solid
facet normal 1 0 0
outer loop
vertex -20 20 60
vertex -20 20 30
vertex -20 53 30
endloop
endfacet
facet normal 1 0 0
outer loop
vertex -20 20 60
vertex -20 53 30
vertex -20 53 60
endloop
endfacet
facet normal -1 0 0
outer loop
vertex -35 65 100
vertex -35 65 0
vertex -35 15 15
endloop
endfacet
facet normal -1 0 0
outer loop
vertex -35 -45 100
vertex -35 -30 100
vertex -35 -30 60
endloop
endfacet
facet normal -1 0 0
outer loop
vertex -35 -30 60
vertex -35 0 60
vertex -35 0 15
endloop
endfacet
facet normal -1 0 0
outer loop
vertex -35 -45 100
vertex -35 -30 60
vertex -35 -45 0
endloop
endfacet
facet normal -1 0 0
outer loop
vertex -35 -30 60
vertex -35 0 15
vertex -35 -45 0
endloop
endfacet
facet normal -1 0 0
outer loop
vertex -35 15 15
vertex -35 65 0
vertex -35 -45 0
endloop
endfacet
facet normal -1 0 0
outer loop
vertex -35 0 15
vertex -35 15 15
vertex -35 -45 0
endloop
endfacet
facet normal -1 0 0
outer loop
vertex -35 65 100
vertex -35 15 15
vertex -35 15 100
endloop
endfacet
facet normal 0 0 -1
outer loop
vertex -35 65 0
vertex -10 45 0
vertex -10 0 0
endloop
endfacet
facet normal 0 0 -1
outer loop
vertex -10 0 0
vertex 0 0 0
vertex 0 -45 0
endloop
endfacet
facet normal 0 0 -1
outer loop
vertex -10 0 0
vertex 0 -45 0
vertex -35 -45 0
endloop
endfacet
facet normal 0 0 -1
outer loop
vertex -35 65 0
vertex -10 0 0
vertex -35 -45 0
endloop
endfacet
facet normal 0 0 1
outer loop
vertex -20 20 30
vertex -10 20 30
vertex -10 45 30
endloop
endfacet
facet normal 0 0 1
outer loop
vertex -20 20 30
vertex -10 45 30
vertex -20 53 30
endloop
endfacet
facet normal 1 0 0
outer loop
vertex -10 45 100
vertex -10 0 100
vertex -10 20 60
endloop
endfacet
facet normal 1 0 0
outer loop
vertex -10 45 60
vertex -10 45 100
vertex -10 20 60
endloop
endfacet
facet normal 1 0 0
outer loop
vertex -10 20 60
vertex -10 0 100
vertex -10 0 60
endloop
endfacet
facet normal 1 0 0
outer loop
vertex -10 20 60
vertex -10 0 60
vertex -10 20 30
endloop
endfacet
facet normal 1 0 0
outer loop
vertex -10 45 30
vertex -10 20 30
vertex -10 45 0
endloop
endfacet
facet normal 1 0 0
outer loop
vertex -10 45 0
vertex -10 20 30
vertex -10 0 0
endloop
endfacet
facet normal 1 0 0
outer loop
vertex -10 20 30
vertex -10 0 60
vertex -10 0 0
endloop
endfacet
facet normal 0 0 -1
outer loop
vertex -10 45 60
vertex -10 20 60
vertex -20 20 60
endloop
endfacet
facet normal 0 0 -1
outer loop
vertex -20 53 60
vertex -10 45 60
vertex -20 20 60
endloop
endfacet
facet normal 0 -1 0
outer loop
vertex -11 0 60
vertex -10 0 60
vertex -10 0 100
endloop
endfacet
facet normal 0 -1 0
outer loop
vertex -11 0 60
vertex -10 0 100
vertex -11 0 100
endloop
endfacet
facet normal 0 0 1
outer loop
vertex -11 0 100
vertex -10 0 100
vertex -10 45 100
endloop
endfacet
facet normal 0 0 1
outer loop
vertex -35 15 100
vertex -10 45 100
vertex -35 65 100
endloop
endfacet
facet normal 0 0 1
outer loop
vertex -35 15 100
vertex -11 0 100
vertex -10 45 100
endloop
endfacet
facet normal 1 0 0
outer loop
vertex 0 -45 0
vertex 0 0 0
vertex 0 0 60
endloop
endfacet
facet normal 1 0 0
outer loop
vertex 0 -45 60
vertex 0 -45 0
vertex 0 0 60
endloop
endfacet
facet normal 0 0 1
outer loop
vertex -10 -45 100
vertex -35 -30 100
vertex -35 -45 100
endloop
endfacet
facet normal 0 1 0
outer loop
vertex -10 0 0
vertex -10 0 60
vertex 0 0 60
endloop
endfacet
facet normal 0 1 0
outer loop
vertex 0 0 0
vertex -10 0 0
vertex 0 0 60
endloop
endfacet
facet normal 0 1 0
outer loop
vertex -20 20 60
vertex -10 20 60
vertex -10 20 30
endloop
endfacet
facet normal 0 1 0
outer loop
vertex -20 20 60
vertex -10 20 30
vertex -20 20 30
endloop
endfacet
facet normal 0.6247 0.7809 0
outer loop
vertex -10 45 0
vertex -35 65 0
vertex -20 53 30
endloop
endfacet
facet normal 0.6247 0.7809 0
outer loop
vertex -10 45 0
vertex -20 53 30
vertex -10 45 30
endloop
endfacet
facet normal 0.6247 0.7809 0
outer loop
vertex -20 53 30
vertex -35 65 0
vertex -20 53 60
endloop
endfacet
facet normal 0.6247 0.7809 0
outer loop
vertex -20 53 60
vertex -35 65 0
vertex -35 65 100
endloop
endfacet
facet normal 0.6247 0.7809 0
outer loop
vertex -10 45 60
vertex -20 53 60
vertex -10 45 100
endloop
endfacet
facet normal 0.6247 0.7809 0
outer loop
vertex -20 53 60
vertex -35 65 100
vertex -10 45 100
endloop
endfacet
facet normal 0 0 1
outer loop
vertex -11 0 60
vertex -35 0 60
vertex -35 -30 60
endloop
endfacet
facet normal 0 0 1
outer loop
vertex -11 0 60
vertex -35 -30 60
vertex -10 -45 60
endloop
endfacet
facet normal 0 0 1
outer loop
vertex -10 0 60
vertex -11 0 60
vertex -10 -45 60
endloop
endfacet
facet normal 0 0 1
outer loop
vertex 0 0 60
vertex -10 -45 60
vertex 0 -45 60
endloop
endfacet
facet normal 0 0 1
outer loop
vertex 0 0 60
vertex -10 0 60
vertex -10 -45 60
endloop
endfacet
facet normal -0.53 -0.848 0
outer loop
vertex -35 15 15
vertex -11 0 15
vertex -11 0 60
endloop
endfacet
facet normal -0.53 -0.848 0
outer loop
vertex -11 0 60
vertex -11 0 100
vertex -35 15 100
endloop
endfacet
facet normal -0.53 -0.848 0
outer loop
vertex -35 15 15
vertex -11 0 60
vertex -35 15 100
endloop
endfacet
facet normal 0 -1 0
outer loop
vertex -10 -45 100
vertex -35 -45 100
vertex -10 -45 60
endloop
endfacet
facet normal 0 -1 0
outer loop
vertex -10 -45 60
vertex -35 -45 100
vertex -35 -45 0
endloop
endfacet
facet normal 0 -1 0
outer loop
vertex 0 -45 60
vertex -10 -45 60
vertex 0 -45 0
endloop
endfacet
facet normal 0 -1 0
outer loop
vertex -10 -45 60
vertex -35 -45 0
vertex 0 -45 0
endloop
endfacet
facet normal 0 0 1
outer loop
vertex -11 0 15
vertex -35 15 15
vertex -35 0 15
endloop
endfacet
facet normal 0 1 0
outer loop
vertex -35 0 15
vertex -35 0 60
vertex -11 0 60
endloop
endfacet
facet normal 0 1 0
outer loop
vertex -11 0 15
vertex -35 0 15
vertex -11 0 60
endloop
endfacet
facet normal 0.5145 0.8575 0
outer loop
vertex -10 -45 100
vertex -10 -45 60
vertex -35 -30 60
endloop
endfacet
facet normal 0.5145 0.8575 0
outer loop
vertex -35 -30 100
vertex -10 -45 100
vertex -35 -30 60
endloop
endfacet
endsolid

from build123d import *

# Parameters (mm, degrees)
F0_W      = 35
F0_H      = 60
F1_DEPTH  = 45
F2_W      = 25
F2_H      = 40
F2_H_2    = 60
F3_DEPTH  = 65
F4_W      = 10
F4_H      = 30
F5_DEPTH  = 45
F7_DEPTH  = 100
F9_DEPTH  = 40
F11_DEPTH = 85


with BuildPart() as f1:
    # F0 (on Front) → F1 (new body)
    with BuildSketch(Plane.XZ):
        with Locations((-17.5, 30)):
            Rectangle(F0_W, F0_H)
    extrude(amount=F1_DEPTH)

    # F2 (on face) → F3 (join)
    with BuildSketch(Plane(origin=(0, 0, 0), x_dir=(-1, 0, 0), z_dir=(0, 1, 0))):
        with Locations((22.5, 80)):
            Rectangle(F2_W, F2_H)
        with Locations((22.5, 30)):
            Rectangle(F2_W, F2_H_2)
    extrude(amount=F3_DEPTH)

    # F4 (on face) → F5 (cut)
    with BuildSketch(Plane(origin=(0, 65, 0), x_dir=(-1, 0, 0), z_dir=(0, 1, 0))):
        with Locations((15, 45)):
            Rectangle(F4_W, F4_H)
    extrude(amount=-F5_DEPTH, mode=Mode.SUBTRACT)

    # F6 (on face) → F7 (cut)
    with BuildSketch(Plane.XY.offset(100)):
        Polygon((-10, 45), (-10, 65), (-35, 65), align=None)
    extrude(amount=-F7_DEPTH, mode=Mode.SUBTRACT)

    # F8 (on face) → F9 (join)
    with BuildSketch(Plane.XY.offset(60)):
        Polygon((-35, -30), (-35, -45), (-10, -45), align=None)
    extrude(amount=F9_DEPTH)

    # F10 (on face) → F11 (cut)
    with BuildSketch(Plane.XY.offset(100)):
        Polygon((-35, 15), (-35, 0), (-11, 0), align=None)
    extrude(amount=-F11_DEPTH, mode=Mode.SUBTRACT)


solid = f1.part
